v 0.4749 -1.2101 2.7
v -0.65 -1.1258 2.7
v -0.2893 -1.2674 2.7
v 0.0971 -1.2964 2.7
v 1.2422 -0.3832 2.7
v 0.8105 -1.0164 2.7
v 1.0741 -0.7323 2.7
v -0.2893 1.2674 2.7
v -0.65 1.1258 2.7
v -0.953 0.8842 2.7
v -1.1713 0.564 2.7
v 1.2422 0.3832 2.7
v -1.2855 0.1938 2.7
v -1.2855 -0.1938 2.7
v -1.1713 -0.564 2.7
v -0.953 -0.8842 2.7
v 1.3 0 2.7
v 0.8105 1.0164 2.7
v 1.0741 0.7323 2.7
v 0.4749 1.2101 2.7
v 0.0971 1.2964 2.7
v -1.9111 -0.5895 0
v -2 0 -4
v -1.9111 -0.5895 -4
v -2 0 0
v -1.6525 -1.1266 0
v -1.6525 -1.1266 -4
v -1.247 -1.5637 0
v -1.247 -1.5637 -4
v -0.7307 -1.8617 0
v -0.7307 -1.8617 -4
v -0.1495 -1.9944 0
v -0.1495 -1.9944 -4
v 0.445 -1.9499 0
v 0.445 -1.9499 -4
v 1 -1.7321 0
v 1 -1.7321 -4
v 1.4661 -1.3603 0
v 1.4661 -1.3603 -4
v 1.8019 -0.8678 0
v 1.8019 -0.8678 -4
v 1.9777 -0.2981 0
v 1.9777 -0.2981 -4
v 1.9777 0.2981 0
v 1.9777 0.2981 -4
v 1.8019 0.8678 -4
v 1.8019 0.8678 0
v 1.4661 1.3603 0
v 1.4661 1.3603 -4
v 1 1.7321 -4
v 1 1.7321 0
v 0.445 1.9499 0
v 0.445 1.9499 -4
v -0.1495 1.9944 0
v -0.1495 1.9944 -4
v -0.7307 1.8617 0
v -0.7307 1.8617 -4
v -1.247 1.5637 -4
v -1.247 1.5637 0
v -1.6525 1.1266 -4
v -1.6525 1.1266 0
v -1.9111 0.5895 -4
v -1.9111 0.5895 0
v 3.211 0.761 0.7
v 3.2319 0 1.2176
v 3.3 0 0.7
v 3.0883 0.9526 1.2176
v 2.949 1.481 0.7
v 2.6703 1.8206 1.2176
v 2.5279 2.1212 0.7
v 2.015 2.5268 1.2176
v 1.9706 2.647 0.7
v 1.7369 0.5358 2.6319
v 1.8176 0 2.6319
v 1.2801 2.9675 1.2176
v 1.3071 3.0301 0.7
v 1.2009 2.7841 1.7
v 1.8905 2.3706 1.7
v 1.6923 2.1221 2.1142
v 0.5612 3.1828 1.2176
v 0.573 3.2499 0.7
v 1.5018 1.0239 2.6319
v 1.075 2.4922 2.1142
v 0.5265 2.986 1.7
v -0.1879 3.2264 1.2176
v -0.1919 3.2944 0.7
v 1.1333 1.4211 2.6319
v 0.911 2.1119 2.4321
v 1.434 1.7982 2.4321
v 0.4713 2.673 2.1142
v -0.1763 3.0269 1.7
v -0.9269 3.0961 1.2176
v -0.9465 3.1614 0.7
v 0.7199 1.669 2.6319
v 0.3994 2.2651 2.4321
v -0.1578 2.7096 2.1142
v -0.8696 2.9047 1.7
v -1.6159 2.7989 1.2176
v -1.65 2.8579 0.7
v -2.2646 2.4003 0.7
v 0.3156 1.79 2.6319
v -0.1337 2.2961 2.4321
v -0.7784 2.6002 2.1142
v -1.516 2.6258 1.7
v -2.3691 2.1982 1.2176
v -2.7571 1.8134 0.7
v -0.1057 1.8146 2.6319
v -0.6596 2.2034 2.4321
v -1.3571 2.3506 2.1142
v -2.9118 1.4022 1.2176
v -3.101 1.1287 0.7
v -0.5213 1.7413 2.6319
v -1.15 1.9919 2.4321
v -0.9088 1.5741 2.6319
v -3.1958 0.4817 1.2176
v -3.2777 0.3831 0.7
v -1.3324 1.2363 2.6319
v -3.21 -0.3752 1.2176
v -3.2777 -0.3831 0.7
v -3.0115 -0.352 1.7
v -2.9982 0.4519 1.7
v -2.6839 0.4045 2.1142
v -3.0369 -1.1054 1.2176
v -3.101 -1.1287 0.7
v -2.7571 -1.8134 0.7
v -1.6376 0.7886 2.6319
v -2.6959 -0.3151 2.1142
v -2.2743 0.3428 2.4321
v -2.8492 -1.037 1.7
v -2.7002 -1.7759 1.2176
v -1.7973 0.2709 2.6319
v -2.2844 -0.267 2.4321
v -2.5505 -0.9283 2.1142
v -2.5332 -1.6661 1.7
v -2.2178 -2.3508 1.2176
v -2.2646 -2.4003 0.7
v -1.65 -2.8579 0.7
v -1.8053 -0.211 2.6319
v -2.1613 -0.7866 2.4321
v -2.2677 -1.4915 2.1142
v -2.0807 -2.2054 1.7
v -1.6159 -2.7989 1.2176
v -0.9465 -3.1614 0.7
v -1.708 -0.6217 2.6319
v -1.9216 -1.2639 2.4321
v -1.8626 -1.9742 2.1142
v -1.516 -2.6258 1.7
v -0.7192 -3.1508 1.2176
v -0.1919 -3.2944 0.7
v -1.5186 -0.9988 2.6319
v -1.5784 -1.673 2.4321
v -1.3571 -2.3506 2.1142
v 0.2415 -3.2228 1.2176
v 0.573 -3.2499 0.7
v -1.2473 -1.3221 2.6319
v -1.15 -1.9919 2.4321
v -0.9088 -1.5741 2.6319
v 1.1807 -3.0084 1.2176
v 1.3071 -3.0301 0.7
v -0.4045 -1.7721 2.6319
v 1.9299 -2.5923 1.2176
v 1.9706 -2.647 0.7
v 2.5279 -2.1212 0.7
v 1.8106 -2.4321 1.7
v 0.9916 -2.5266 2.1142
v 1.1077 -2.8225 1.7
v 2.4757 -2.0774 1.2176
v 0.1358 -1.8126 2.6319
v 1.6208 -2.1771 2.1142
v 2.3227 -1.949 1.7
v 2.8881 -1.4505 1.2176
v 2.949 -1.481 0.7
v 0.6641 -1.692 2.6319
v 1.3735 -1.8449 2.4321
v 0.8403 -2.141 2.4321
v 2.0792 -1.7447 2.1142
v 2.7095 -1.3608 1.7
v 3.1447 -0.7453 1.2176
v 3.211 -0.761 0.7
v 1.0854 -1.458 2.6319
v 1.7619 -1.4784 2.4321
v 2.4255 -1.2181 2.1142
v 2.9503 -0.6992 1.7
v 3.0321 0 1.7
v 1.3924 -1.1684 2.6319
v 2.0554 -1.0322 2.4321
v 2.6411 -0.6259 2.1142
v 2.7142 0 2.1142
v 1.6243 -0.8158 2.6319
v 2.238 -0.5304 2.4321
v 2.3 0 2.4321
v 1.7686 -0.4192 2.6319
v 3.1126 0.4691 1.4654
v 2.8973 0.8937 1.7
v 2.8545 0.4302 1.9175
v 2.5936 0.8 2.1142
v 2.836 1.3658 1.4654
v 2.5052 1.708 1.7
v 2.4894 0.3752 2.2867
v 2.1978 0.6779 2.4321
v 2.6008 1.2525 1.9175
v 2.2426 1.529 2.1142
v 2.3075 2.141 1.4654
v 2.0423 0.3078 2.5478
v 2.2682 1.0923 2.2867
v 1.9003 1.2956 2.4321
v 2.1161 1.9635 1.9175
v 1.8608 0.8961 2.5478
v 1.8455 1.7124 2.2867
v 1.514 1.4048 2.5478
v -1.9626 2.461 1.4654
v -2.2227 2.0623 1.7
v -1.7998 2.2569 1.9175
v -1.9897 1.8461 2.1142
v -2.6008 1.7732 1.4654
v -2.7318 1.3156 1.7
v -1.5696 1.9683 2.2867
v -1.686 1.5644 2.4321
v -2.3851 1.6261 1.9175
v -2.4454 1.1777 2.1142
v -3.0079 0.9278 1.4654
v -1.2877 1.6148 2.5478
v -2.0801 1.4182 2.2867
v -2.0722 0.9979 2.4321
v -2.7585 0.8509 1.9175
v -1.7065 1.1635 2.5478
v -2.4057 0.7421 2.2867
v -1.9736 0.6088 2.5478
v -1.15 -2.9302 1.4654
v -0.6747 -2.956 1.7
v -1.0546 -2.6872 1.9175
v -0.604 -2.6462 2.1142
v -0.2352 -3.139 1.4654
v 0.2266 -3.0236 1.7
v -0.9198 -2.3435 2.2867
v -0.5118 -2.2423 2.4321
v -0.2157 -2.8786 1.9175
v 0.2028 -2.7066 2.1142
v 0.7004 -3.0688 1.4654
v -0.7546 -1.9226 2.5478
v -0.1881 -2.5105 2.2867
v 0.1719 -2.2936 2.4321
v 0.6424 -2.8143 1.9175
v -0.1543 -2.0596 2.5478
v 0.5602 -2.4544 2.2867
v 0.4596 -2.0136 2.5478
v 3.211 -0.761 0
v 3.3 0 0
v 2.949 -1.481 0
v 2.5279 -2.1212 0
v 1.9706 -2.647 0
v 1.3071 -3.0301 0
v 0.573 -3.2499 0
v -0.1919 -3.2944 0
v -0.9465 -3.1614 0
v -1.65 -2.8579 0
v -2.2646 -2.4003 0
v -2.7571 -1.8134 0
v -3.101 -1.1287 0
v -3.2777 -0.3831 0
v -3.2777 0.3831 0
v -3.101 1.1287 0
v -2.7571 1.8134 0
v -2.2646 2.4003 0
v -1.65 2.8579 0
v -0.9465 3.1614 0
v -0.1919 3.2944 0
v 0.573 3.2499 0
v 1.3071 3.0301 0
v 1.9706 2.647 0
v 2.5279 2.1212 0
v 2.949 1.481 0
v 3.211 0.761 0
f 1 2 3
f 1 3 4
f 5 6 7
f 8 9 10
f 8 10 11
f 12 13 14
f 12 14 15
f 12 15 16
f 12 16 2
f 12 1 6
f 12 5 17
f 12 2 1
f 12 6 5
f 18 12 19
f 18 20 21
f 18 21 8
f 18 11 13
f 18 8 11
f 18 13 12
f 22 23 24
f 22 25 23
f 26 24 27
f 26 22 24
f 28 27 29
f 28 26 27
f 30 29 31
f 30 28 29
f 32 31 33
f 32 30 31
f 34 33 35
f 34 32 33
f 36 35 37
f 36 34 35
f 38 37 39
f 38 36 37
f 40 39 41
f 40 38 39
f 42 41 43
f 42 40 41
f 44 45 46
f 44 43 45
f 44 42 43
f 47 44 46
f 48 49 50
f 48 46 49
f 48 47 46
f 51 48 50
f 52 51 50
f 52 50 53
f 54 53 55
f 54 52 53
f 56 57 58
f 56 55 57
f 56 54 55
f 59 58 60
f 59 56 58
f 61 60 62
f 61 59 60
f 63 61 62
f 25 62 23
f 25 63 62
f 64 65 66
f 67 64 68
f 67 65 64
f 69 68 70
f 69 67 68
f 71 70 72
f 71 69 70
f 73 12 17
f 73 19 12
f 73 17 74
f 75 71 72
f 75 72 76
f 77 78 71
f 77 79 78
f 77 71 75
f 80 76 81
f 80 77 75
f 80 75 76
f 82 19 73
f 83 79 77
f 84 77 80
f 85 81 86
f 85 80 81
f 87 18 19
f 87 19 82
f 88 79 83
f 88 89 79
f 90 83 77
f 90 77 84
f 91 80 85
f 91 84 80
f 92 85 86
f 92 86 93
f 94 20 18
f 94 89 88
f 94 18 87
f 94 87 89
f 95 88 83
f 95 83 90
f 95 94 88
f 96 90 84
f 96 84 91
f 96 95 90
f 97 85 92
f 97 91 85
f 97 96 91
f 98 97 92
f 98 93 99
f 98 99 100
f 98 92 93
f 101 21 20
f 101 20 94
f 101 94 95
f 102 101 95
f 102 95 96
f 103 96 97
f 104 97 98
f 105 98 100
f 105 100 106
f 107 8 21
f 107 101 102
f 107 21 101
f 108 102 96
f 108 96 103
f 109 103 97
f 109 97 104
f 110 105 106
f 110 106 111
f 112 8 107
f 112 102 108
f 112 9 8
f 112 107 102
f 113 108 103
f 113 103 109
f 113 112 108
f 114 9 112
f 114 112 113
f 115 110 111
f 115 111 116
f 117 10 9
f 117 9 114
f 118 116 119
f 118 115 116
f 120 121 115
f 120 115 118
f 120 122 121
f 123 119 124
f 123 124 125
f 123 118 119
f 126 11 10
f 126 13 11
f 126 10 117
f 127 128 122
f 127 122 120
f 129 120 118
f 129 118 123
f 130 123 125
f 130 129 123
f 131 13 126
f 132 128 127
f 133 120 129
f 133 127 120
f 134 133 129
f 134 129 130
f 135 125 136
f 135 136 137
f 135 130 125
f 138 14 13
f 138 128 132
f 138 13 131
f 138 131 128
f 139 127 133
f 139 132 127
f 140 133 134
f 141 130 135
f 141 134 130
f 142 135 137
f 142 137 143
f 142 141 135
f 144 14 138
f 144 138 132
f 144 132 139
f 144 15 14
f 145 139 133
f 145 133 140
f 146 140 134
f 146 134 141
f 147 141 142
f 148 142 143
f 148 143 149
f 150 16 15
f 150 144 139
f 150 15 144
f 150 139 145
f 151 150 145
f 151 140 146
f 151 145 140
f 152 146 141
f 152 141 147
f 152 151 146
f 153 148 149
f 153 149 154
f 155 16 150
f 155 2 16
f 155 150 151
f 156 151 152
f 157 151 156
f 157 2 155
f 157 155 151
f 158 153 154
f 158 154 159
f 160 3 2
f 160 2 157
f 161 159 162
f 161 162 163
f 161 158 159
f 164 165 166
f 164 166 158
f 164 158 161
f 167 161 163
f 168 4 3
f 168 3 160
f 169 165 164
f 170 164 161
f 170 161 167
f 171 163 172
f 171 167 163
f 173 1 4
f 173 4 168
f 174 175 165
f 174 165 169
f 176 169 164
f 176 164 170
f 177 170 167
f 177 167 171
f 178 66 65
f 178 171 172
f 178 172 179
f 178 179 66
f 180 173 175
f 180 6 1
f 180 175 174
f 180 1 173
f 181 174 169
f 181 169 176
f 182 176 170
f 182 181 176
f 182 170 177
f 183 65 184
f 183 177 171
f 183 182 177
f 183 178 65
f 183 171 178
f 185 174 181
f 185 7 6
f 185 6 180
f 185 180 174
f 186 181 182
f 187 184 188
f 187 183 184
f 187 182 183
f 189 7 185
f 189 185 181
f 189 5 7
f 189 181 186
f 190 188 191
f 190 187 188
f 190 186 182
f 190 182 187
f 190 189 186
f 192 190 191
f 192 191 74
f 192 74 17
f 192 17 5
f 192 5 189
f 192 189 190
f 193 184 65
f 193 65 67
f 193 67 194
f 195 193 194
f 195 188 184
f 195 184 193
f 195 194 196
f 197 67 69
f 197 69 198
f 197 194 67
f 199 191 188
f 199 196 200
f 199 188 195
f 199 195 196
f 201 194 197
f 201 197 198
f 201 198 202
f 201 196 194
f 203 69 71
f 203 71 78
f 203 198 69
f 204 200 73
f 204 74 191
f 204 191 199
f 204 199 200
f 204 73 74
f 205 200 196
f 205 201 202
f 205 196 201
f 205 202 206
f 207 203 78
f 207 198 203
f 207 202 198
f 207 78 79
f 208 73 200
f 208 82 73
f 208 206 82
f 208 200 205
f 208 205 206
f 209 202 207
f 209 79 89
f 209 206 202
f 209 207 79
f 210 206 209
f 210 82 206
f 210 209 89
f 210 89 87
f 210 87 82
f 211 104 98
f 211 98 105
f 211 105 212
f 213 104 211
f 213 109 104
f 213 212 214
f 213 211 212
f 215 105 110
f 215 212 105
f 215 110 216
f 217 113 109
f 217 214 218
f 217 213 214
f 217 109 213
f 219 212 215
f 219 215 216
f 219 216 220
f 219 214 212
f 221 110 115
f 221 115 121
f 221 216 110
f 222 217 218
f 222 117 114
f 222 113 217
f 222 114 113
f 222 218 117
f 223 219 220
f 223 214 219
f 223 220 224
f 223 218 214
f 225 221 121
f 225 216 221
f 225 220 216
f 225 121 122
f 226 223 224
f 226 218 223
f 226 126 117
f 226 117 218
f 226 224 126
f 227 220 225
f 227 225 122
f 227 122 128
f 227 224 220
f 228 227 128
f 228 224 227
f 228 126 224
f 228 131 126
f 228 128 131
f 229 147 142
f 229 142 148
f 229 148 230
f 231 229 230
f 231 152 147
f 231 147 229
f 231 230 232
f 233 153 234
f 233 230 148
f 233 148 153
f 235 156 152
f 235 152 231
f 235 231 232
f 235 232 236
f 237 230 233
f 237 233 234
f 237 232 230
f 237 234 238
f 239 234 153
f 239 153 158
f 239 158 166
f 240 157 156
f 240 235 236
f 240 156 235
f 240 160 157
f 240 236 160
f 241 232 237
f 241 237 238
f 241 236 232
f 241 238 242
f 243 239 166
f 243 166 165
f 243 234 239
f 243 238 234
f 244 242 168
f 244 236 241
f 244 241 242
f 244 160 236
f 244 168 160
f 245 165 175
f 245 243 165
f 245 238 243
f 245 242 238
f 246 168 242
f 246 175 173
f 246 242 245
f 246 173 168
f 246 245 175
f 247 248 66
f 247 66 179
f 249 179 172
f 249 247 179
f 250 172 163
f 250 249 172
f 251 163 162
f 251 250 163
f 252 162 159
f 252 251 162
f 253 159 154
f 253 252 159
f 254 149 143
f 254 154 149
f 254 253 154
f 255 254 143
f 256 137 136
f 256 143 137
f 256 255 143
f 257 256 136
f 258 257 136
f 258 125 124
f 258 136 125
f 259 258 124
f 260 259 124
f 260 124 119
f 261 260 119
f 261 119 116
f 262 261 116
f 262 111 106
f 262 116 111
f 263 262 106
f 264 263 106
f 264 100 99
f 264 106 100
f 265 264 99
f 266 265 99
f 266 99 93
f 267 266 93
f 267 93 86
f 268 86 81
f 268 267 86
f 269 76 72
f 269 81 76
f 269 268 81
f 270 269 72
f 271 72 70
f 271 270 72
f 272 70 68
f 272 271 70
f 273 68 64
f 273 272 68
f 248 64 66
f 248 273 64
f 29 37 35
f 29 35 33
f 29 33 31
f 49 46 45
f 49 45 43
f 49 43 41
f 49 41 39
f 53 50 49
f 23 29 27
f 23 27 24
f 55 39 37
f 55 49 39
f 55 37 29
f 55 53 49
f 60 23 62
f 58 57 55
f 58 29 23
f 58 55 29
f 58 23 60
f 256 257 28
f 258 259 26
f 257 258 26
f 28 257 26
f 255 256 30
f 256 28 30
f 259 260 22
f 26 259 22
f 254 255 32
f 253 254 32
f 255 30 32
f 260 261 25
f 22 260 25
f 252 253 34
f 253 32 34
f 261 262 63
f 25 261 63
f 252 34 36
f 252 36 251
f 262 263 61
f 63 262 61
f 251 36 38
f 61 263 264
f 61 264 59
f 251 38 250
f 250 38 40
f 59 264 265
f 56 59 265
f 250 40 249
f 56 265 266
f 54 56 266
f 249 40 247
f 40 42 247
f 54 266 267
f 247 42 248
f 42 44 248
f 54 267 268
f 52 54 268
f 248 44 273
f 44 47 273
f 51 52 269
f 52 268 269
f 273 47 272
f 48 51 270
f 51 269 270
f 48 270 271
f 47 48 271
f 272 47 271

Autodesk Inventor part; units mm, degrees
ref_plane "YZ Plane" through (0, 0, 0) normal (1, 0, 0) x (0, 1, 0)
ref_plane "XZ Plane" through (0, 0, 0) normal (0, 1, 0) x (-1, 0, 0)
ref_plane "XY Plane" through (0, 0, 0) normal (0, 0, 1) x (1, 0, 0)
sketch "Sketch1" plane through (0, 0, 0) normal (0, 0, 1) x (1, 0, 0)
  circle A0 centre (0, 0) radius 3.3
  dimension "d0" = 6.6
extrude "Extrusion1" add sketch "Sketch1" along normal blind 2.7
fillet "Fillet1" radius 2 1 edges at (-3.3, 0, 2.7)
sketch "Sketch2" plane through (0, 0, 0) normal (0, 0, -1) x (-1, 0, 0)
  circle A0 centre (0, 0) radius 2
  dimension "d4" = 4
extrude "Extrusion2" add sketch "Sketch2" along normal blind 4
thread "Thread1" size "M4x0.7" class "6g" standard "ANSI Metric M Profile" full length
properties part number "round m4x5"
